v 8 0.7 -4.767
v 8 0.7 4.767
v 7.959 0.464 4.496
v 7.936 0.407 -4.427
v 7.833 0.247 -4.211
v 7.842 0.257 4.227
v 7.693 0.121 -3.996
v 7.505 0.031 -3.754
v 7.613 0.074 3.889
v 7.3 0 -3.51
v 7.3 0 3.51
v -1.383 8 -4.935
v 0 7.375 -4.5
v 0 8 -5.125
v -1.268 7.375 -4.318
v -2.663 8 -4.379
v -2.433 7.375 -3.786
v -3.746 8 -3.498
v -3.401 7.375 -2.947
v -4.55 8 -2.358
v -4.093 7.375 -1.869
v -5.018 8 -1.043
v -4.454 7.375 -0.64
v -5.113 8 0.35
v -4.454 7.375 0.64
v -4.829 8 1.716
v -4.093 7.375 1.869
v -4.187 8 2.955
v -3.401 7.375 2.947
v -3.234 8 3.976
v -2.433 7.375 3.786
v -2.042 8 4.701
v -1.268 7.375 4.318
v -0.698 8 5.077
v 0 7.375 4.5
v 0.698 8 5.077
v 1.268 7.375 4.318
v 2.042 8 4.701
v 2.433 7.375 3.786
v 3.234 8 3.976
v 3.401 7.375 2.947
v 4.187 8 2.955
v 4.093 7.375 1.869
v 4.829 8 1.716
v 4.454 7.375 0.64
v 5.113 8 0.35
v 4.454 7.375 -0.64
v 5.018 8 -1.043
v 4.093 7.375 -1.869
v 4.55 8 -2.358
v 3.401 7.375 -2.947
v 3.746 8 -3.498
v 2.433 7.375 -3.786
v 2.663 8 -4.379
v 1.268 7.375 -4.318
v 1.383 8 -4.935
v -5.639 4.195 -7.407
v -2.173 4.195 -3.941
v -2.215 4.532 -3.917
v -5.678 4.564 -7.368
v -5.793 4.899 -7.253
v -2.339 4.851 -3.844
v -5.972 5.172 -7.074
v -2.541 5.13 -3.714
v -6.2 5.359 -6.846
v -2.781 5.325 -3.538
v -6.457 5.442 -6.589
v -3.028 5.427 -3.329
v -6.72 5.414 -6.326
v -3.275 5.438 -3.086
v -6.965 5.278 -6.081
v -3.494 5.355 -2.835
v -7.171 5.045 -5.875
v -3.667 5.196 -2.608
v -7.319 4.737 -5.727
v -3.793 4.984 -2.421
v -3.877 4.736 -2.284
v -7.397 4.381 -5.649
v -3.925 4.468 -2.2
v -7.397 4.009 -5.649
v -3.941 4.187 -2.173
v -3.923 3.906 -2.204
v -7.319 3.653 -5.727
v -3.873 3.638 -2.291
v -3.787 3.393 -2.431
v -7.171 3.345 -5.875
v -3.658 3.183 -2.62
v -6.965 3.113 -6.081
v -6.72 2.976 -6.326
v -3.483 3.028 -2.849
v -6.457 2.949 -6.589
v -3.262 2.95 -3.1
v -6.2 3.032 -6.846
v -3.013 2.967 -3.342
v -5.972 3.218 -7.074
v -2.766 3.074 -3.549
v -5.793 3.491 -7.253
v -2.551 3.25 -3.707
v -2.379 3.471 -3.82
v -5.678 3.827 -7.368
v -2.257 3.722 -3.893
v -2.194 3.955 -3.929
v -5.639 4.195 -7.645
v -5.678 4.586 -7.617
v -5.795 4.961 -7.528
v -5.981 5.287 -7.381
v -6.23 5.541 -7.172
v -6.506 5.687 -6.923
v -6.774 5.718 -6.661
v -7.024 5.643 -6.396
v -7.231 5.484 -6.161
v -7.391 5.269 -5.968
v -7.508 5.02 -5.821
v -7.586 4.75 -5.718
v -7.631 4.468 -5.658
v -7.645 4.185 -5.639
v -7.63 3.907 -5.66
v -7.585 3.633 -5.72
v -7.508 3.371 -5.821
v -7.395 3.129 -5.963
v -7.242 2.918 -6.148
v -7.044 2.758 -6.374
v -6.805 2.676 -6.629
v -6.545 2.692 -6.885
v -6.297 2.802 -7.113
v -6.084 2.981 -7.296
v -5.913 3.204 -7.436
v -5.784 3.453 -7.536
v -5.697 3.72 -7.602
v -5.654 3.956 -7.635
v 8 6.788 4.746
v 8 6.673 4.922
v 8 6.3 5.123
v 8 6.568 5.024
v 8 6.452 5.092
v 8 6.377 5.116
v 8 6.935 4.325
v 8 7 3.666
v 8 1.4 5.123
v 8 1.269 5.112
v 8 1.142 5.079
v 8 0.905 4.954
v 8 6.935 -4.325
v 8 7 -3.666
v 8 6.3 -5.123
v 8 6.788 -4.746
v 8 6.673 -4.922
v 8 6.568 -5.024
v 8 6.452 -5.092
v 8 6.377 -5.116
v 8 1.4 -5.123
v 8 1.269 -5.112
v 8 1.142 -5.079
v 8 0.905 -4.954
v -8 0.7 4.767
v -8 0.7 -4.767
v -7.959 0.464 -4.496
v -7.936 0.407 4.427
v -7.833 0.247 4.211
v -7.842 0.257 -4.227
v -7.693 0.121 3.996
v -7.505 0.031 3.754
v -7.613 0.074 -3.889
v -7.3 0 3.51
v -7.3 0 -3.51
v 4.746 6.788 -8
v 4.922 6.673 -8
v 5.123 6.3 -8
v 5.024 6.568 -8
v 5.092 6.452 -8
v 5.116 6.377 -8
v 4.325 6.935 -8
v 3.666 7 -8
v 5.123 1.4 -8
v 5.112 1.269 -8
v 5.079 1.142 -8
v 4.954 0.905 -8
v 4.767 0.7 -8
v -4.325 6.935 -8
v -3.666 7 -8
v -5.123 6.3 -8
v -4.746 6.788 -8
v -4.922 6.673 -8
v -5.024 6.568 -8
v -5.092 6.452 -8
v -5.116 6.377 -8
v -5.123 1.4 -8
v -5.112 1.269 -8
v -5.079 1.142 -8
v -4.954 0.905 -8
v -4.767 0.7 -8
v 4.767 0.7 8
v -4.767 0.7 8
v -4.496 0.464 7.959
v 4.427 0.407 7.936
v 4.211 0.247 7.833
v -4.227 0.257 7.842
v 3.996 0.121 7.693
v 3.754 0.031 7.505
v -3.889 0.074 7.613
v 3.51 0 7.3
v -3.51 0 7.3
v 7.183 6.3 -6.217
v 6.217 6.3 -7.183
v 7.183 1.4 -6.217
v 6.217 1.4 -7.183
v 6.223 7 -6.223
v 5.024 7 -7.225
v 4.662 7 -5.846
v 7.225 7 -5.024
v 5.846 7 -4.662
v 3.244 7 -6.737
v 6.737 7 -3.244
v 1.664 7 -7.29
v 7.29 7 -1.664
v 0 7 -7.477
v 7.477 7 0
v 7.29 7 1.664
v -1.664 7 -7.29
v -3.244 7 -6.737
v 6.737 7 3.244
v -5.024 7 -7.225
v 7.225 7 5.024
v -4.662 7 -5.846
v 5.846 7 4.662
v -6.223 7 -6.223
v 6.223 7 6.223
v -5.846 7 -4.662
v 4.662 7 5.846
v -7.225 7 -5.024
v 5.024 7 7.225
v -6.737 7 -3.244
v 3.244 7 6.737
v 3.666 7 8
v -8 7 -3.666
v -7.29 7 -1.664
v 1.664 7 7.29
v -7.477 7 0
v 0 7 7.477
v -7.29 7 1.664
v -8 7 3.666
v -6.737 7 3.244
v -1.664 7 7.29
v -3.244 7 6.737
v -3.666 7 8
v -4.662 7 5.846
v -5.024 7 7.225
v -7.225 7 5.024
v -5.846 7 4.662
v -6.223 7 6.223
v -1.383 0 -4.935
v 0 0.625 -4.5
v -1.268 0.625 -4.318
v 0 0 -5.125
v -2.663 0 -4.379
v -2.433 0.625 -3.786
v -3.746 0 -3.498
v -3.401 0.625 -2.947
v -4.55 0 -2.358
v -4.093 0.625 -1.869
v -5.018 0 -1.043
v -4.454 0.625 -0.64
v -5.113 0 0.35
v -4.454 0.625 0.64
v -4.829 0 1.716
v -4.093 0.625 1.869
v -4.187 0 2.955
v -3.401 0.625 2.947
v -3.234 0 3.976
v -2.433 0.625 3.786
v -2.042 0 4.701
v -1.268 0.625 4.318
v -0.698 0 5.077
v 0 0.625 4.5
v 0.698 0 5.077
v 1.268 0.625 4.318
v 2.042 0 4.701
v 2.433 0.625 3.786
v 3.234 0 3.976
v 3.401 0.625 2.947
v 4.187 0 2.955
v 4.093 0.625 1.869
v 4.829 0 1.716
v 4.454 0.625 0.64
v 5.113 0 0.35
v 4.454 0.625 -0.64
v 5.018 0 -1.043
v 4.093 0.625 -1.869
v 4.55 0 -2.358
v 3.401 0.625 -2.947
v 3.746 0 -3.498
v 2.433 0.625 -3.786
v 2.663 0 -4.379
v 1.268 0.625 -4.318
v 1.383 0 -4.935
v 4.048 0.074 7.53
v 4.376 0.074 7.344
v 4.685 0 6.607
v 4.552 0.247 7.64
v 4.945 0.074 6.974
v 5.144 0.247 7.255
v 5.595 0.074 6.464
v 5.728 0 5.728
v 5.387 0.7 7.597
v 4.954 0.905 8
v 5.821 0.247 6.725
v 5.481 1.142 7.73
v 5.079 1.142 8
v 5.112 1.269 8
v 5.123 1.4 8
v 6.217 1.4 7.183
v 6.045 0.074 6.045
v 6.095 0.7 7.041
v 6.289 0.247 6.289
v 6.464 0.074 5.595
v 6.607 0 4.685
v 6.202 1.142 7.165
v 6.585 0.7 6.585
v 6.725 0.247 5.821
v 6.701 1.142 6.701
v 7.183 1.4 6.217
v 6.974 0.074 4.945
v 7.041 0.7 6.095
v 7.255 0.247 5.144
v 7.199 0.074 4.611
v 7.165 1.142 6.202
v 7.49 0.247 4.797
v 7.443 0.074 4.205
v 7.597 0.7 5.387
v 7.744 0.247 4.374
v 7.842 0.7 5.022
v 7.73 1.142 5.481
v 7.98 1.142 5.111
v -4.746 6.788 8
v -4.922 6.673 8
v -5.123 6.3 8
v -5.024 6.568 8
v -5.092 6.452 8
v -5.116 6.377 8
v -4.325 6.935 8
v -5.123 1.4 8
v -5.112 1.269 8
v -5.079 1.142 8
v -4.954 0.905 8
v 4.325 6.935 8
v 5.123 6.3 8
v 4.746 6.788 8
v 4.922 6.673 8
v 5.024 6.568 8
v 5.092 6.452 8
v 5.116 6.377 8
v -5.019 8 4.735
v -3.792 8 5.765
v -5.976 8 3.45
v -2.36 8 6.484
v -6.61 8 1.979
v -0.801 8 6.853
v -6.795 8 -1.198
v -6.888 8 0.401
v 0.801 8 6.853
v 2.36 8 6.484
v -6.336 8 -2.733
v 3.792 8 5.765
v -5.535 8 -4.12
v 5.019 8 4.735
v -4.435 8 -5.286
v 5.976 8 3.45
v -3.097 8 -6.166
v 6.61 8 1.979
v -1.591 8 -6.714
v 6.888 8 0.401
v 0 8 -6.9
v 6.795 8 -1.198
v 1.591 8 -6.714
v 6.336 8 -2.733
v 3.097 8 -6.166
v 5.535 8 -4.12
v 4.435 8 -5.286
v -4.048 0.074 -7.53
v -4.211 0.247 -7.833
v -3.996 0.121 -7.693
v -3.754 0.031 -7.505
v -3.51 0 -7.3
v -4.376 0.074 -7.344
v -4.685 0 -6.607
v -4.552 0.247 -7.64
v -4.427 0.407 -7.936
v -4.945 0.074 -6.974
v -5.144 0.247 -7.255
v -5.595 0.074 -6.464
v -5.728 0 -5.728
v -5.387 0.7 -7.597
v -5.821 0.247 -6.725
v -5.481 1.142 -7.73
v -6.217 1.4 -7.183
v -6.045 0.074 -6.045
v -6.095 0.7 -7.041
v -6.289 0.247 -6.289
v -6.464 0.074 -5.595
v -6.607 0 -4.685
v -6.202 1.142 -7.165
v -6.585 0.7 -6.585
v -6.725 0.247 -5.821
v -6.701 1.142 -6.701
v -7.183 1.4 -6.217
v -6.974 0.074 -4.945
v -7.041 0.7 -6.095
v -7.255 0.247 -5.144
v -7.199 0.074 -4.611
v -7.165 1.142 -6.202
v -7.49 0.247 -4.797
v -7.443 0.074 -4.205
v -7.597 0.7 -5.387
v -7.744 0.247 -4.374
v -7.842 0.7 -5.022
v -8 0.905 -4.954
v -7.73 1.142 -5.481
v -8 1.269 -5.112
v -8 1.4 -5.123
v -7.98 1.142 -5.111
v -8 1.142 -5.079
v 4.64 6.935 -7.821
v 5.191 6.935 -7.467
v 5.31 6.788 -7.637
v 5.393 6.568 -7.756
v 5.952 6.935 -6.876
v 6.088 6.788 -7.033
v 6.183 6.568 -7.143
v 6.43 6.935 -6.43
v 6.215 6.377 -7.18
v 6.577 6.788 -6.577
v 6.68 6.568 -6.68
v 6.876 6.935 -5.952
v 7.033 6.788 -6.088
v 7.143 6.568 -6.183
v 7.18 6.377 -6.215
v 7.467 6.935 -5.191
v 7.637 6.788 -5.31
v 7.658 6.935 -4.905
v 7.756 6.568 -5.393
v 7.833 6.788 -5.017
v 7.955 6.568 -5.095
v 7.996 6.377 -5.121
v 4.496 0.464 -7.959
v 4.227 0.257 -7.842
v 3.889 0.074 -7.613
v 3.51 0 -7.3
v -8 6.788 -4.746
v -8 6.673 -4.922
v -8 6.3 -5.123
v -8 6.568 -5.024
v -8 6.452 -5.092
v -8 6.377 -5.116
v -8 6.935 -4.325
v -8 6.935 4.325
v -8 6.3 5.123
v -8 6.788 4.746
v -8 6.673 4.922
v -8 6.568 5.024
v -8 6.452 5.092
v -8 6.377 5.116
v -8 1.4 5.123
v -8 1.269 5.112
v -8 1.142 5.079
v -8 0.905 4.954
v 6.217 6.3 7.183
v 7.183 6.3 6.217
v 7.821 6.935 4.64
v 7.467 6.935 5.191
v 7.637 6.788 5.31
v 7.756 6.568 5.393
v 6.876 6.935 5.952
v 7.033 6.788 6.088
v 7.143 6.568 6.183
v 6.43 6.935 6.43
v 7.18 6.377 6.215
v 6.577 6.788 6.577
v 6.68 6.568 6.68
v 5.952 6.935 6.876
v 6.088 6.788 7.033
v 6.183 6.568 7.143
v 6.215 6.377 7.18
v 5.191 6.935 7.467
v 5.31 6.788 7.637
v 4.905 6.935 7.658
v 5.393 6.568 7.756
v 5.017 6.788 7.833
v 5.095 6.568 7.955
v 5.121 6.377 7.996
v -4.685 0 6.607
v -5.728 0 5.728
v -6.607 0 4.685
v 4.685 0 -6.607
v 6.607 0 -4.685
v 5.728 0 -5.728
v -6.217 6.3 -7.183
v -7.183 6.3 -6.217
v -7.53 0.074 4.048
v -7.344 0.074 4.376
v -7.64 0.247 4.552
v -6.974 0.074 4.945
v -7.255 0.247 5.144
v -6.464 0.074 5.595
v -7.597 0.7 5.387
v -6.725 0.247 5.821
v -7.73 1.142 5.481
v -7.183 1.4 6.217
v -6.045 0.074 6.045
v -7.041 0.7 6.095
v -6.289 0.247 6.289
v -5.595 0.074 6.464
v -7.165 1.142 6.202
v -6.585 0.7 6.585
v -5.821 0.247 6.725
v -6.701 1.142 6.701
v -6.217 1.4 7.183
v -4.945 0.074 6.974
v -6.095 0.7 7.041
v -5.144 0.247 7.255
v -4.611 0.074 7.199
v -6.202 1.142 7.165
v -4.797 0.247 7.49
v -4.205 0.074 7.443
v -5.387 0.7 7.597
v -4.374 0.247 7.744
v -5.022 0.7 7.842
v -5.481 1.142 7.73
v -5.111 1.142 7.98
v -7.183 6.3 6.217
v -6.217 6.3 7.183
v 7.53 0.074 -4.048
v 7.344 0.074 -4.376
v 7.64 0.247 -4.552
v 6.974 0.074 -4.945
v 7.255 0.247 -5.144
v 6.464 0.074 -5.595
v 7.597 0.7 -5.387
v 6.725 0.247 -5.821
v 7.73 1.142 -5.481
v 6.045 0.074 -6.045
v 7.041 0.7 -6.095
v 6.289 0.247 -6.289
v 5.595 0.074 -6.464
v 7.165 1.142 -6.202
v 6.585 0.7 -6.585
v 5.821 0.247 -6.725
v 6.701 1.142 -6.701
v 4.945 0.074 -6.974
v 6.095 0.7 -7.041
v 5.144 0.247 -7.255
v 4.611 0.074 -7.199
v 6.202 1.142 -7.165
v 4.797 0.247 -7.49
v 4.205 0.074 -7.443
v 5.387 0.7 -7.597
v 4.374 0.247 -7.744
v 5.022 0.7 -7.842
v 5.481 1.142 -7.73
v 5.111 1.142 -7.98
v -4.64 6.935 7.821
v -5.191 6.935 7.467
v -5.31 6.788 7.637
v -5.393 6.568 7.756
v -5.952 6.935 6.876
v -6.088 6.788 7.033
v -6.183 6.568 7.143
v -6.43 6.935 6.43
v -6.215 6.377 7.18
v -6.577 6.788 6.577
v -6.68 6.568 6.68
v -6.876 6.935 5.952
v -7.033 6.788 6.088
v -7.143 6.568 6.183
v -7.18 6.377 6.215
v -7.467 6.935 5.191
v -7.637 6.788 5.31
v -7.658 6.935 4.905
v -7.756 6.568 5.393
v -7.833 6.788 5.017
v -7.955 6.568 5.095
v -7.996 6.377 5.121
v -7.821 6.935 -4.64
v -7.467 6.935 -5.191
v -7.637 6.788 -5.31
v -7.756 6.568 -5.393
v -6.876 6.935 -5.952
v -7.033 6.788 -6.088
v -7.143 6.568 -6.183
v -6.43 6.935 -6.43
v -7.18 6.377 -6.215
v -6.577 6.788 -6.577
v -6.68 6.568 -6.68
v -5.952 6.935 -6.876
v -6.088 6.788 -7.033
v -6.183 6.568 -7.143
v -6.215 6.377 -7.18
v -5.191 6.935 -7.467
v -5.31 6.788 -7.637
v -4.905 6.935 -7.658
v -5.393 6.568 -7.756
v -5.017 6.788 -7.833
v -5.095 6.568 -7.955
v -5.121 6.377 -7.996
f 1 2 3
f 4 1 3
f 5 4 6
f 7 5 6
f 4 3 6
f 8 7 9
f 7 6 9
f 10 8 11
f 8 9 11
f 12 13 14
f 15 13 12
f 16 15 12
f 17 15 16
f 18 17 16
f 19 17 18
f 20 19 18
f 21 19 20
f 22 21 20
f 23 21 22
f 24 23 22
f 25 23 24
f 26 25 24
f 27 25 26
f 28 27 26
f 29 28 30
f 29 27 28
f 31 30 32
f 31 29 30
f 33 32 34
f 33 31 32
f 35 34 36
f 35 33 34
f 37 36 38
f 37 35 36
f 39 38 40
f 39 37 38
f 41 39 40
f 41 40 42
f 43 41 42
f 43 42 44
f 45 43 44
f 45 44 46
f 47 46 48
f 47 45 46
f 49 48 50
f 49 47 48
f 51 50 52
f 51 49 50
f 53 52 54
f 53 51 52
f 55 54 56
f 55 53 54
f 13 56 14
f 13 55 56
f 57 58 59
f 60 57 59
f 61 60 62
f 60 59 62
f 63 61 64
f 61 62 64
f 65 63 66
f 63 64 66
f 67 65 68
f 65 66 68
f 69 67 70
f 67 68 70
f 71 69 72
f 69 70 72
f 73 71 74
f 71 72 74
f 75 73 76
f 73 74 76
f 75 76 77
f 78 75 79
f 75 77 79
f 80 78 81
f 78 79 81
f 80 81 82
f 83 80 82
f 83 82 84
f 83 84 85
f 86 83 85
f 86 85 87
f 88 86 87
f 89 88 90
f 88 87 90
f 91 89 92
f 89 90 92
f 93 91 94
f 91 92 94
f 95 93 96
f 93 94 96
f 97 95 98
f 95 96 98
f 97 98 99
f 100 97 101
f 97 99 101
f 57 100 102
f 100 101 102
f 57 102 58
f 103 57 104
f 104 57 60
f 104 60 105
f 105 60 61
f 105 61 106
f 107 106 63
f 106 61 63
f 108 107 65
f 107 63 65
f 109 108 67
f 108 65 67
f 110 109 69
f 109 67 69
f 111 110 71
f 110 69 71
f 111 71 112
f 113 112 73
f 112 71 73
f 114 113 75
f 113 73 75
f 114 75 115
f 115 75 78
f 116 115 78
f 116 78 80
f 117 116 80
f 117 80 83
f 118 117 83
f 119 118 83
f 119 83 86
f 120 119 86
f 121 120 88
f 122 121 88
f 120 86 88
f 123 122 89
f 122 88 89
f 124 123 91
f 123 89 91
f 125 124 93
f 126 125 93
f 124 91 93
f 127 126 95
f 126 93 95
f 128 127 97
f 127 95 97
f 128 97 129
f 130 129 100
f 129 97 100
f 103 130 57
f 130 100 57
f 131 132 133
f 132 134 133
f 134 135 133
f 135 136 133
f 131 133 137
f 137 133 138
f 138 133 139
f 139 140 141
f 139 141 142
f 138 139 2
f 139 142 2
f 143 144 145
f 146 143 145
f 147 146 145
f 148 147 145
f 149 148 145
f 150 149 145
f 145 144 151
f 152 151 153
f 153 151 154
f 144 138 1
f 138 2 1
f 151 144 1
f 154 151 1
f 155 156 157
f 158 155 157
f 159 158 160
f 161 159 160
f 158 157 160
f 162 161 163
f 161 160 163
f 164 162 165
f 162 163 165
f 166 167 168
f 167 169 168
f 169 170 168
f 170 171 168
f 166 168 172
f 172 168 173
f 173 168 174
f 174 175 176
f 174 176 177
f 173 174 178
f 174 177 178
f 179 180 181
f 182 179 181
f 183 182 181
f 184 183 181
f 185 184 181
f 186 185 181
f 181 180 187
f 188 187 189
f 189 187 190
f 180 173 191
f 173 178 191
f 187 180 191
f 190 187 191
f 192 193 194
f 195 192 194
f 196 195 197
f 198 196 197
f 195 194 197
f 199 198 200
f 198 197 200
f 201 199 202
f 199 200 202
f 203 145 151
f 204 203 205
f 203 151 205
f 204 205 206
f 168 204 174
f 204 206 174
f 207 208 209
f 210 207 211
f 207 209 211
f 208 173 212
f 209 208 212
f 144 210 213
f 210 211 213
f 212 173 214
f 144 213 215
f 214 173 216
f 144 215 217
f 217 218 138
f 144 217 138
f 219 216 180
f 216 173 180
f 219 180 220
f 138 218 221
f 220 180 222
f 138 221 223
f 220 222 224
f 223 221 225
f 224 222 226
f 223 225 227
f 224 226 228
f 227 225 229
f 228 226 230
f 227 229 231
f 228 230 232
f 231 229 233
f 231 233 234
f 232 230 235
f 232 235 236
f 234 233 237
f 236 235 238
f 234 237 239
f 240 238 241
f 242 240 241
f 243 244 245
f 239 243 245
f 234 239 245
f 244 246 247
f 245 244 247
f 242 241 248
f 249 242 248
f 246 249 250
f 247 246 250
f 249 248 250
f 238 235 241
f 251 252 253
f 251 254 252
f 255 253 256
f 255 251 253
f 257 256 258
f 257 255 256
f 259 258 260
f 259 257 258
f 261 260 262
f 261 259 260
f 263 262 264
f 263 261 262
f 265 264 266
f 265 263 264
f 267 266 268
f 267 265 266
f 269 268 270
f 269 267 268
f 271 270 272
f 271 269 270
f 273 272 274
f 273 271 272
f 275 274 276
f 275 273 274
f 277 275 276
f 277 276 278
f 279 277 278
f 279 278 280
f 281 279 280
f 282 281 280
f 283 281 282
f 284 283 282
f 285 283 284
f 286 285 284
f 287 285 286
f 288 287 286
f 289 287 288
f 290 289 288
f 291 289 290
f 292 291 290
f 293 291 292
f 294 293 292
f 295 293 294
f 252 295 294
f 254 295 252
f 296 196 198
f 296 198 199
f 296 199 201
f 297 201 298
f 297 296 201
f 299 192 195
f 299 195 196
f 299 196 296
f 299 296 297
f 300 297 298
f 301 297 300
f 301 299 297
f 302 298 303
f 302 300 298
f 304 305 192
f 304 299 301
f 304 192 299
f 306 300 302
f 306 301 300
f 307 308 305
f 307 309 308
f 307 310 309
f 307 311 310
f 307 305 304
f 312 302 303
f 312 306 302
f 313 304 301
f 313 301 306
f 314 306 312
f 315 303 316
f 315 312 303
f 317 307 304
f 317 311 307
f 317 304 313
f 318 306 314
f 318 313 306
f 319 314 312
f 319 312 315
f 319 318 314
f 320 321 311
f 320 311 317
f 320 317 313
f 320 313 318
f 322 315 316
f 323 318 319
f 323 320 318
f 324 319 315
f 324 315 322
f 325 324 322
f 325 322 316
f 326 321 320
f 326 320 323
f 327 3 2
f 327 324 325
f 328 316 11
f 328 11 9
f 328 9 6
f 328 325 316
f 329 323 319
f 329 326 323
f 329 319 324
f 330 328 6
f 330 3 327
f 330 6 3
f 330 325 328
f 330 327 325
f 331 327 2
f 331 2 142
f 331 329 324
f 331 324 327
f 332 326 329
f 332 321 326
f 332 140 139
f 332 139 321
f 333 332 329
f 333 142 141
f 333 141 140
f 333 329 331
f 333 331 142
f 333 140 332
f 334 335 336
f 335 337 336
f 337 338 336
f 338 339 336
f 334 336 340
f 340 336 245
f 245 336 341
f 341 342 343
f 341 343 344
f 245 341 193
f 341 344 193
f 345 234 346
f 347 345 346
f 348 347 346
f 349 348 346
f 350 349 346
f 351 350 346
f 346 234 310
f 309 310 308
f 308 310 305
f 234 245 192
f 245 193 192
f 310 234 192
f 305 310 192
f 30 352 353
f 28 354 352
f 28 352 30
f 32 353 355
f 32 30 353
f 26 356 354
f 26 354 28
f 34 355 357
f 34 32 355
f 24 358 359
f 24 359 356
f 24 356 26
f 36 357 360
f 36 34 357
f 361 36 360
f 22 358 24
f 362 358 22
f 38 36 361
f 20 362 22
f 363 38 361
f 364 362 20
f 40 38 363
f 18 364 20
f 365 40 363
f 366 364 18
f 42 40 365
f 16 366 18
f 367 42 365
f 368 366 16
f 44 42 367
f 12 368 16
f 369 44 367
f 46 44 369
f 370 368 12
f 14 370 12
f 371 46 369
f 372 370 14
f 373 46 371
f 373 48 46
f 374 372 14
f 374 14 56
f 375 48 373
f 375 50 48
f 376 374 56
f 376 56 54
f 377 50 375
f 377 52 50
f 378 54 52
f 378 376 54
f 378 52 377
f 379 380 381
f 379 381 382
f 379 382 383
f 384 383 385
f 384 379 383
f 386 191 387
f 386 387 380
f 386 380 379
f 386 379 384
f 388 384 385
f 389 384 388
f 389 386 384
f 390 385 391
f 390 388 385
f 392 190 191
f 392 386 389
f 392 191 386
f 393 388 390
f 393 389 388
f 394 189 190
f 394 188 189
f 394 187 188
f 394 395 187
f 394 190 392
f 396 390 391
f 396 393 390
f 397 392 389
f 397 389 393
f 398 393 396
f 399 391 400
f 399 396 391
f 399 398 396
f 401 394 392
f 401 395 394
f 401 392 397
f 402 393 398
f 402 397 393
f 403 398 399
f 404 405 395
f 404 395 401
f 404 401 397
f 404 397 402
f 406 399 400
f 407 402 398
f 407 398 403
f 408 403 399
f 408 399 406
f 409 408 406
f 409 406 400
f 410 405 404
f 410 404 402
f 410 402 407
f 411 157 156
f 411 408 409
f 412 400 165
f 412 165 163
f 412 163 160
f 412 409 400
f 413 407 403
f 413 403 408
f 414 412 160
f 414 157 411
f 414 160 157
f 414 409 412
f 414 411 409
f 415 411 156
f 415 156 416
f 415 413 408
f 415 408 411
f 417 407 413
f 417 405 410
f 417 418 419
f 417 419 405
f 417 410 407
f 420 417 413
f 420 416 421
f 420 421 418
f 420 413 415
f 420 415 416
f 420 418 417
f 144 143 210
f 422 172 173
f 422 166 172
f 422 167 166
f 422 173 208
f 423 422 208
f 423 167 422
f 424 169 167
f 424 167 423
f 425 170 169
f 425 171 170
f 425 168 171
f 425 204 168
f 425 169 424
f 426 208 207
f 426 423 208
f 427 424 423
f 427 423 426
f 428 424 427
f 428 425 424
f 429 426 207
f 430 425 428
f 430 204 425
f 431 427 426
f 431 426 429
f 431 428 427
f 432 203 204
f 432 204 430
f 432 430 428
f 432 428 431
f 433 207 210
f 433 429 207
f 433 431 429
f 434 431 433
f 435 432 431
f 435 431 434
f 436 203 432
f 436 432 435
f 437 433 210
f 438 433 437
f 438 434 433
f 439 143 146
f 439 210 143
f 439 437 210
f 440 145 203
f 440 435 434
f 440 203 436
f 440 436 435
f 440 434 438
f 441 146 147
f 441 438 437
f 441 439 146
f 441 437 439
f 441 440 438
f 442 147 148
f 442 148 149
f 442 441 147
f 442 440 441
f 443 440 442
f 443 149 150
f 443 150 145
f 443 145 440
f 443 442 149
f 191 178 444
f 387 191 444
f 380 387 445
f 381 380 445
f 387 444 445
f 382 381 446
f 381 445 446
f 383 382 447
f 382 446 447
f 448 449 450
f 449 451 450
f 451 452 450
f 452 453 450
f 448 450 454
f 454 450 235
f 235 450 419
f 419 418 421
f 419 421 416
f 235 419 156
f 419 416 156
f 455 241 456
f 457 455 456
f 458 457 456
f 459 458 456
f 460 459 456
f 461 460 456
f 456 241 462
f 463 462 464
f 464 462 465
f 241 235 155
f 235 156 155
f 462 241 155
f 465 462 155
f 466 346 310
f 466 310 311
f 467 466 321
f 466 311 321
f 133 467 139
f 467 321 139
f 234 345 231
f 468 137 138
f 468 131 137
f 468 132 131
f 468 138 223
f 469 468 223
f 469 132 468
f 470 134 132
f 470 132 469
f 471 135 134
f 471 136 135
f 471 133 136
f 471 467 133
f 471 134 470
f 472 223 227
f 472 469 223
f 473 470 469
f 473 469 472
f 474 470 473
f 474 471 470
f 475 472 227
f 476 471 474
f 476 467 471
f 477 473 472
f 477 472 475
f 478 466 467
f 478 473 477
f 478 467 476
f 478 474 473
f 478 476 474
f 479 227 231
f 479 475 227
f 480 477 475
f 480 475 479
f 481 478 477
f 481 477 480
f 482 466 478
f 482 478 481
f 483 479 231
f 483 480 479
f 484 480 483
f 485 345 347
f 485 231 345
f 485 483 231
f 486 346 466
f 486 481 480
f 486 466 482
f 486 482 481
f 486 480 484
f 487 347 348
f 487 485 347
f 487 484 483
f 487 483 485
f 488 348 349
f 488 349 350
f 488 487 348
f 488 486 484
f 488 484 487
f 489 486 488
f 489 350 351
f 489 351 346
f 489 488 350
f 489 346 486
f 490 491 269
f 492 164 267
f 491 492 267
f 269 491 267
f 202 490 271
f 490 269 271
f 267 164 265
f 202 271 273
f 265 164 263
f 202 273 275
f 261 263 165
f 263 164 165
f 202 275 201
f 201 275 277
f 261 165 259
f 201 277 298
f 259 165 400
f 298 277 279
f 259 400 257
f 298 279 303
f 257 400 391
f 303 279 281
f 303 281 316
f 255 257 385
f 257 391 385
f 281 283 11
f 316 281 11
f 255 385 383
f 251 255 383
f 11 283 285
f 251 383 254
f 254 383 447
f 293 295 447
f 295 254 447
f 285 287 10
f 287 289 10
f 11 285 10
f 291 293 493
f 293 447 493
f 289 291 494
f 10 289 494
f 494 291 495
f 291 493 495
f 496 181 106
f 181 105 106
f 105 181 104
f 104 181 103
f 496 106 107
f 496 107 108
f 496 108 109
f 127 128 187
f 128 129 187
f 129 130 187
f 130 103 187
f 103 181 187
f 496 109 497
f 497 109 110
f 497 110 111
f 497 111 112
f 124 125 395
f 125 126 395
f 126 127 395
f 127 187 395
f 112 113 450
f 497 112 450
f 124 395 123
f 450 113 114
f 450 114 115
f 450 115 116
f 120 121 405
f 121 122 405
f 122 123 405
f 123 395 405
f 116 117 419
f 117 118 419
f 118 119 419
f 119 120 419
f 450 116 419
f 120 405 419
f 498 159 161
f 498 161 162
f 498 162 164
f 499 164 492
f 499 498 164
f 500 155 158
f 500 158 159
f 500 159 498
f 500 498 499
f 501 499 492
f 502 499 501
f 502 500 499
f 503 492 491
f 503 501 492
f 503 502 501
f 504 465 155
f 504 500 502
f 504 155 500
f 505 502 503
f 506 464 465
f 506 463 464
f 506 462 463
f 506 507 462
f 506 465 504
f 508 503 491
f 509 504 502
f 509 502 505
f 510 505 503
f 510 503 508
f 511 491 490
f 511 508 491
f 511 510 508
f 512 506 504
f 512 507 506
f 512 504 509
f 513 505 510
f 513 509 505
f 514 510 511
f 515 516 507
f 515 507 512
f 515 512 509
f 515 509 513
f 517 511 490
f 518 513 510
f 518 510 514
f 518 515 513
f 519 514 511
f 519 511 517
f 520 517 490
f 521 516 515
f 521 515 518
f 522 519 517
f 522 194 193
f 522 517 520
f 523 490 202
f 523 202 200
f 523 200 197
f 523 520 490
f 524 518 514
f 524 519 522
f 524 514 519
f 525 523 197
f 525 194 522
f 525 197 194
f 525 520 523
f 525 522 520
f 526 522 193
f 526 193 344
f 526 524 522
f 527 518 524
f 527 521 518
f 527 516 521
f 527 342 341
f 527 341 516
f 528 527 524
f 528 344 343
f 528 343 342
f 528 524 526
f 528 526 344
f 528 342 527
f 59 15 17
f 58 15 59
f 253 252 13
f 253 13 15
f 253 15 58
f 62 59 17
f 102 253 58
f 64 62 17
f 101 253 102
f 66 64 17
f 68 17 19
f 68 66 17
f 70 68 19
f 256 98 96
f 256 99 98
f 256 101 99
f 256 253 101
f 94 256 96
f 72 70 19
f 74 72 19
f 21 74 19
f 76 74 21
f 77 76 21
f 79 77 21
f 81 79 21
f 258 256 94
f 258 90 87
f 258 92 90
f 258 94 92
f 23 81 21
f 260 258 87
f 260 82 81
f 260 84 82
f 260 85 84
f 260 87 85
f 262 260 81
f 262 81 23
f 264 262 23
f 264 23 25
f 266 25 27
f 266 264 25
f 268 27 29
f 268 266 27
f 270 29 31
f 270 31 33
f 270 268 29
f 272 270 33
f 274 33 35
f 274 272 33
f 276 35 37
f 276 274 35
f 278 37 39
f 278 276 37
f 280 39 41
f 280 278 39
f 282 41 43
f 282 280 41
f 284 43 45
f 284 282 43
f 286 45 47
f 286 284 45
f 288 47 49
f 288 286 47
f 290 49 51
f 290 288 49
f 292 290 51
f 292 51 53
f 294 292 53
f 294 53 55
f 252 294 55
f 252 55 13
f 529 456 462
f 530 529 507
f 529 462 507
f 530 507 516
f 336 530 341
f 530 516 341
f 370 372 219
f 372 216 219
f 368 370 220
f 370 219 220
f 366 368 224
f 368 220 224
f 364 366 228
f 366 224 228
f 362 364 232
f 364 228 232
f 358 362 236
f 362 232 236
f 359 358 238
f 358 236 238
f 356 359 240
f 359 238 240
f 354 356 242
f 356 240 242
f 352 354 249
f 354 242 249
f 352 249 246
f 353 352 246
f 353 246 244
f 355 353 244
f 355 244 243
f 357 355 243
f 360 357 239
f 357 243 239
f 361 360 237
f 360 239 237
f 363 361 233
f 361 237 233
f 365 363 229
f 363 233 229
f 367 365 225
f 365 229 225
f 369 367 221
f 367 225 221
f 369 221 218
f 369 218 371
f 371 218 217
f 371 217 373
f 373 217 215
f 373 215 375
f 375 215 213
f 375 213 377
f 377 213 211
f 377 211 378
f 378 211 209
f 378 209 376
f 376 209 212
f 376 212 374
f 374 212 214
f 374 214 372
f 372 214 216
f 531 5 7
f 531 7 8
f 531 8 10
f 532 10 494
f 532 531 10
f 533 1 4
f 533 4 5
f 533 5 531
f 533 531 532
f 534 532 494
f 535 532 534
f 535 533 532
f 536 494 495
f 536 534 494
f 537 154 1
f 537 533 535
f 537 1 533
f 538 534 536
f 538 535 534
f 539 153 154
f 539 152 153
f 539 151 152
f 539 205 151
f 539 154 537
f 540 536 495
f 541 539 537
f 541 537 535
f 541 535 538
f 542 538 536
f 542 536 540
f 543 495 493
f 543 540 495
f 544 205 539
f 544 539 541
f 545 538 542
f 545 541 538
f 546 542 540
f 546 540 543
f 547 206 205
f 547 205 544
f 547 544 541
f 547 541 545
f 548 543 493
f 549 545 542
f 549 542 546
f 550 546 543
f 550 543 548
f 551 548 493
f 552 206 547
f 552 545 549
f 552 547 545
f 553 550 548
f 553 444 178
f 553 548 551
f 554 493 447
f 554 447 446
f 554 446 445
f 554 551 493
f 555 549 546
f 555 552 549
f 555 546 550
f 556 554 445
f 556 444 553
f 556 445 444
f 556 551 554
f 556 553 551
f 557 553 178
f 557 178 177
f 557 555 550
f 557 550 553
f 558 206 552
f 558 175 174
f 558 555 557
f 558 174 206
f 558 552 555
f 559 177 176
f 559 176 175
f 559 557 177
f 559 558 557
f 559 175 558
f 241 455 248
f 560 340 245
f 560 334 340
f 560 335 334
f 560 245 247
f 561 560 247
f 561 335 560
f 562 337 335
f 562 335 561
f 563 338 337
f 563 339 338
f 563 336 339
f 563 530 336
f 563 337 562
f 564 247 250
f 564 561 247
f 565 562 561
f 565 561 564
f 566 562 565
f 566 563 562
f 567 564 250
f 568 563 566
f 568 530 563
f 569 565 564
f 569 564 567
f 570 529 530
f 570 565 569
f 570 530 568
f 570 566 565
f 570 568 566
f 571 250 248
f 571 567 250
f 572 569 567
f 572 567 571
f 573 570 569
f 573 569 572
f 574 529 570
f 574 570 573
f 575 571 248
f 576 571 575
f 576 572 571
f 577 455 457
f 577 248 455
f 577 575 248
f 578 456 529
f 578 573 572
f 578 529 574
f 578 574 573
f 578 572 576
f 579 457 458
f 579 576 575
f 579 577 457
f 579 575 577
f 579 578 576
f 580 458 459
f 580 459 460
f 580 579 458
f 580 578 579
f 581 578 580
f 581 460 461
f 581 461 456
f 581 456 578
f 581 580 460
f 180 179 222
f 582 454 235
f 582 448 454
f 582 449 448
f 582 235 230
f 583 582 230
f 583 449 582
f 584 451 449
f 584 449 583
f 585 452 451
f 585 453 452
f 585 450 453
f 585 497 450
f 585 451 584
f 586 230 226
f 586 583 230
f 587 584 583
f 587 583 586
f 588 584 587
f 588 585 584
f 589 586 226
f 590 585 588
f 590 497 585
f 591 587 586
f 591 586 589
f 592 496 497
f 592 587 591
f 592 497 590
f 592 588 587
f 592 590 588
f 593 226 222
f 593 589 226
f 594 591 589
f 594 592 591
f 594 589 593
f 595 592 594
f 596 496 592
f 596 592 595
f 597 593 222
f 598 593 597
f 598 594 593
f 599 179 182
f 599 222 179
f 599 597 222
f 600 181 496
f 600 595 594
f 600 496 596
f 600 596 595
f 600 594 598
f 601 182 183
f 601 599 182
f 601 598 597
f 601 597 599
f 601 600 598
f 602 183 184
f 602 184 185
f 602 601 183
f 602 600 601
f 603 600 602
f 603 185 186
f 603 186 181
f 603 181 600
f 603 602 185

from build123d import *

# Parameters (mm, degrees)
BOSS_EXTRUDE1_DEPTH = 8
FILLET2_R           = 1.4
FILLET3_R           = 0.7


with BuildPart() as part:
    # Sketch1 → Boss-Extrude1 (new body)
    with BuildSketch(Plane(origin=(0, 0, 0), x_dir=(1, 0, 0), z_dir=(0, 1, 0))):
        with BuildLine():
            Line((-8, 5.123475383), (-8, -5.123475383))
            ThreePointArc((-8, -5.123475383), (-6.717514421, -6.717514421), (-5.123475383, -8))
            Line((-5.123475383, -8), (5.123475383, -8))
            ThreePointArc((5.123475383, -8), (6.717514421, -6.717514421), (8, -5.123475383))
            Line((8, -5.123475383), (8, 5.123475383))
            ThreePointArc((8, 5.123475383), (6.717514421, 6.717514421), (5.123475383, 8))
            Line((5.123475383, 8), (-5.123475383, 8))
            ThreePointArc((-5.123475383, 8), (-6.717514421, 6.717514421), (-8, 5.123475383))
        make_face()
    extrude(amount=BOSS_EXTRUDE1_DEPTH)

    # Sketch2 → Cut-Revolve1 (revolve, cut)
    with BuildSketch(Plane.XY, mode=Mode.PRIVATE) as cut_revolve1_sk:
        Polygon((6.9, 8), (7.477350269, 7), (9.756701135, 7), (9.756701135, 8), align=None)
    revolve(cut_revolve1_sk.sketch.rotate(Axis((0, 0, 0), (0, 1, 0)), 90), axis=Axis((0, 0, 0), (0, 1, 0)), mode=Mode.SUBTRACT)

    # Sketch5 → M10x1.0 Tapped Hole1 (revolve, cut)
    with BuildSketch(Plane(origin=(0, 0, 0), x_dir=(0, 0, -1), z_dir=(1, 0, 0))):
        Polygon((0, 0), (0, 8), (5.125, 8), (4.5, 7.375), (4.5, 0.625), (5.125, 0), align=None)
    revolve(axis=Axis((0, -6.35, 0), (0, 1, 0)), mode=Mode.SUBTRACT)

    # M3 Tapped Hole1: read off the stored shape, not the designer's step
    # M3 Tapped Hole1 outline → M3 Tapped Hole1 (revolve, cut)
    with BuildSketch(Plane(origin=(0, 4.19513424, 0), x_dir=(0.7071067811865471, 0, -0.707106781186548), z_dir=(0, -1, 0))):
        Polygon((0, -9.500060785), (1.525060785, -9.500060785), (1.25, -9.225), (1.25, -4.322803032), (0, -4.322803032), align=None)
    revolve(axis=Axis((0, 4.19513424, 0), (0.707106781186548, 0, 0.7071067811865471)), mode=Mode.SUBTRACT)

    # Fillet2
    fillet2_edges = [part.edges().sort_by_distance(p)[0] for p in [
        (6.717514421, 0, 6.717514421),
        (-6.717514421, 0, 6.717514421),
        (-6.717514421, 0, -6.717514421),
        (6.717514421, 0, -6.717514421),
    ]]
    fillet(fillet2_edges, radius=FILLET2_R)

    # Fillet3
    # the kernel refuses this fillet: 0.7 mm, written as the material it takes off along each edge
    with BuildSketch(Plane(origin=(0, 7, 0), x_dir=(-0.3759346527851674, 0, 0.9266461767229688), z_dir=(0.9266461767229688, 0, 0.3759346527851674))) as fillet3_piece_1:
        with BuildLine():
            CenterArc((9.5 - FILLET3_R, FILLET3_R), FILLET3_R, 270, 90)
            Line((9.5, FILLET3_R), (9.5, 0))
            Line((9.5, 0), (9.5 - FILLET3_R, 0))
        make_face()
    revolve(axis=Axis((0, 7, 0), (0, -1, 0)), revolution_arc=45.835816267, mode=Mode.SUBTRACT)
    with BuildSketch(Plane(origin=(0, 7, 0), x_dir=(-0.9266461767229688, 0, -0.3759346527851675), z_dir=(-0.3759346527851675, 0, 0.9266461767229688))) as fillet3_piece_2:
        with BuildLine():
            CenterArc((9.5 - FILLET3_R, FILLET3_R), FILLET3_R, 270, 90)
            Line((9.5 - FILLET3_R, 0), (9.5, 0))
            Line((9.5, 0), (9.5, FILLET3_R))
        make_face()
    revolve(axis=Axis((0, 7, 0), (0, -1, 0)), revolution_arc=45.835816267, mode=Mode.SUBTRACT)
    with BuildSketch(Plane(origin=(0, 7, 0), x_dir=(0.3759346527851687, 0, -0.9266461767229682), z_dir=(-0.9266461767229682, 0, -0.3759346527851687))) as fillet3_piece_3:
        with BuildLine():
            CenterArc((9.5 - FILLET3_R, FILLET3_R), FILLET3_R, 270, 90)
            Line((9.5 - FILLET3_R, 0), (9.5, 0))
            Line((9.5, 0), (9.5, FILLET3_R))
        make_face()
    revolve(axis=Axis((0, 7, 0), (0, -1, 0)), revolution_arc=45.835816267, mode=Mode.SUBTRACT)
    with BuildSketch(Plane(origin=(0, 7, 0), x_dir=(0.9266461767229706, 0, 0.3759346527851629), z_dir=(0.3759346527851629, 0, -0.9266461767229706))) as fillet3_piece_4:
        with BuildLine():
            CenterArc((9.5 - FILLET3_R, FILLET3_R), FILLET3_R, 270, 90)
            Line((9.5, FILLET3_R), (9.5, 0))
            Line((9.5, 0), (9.5 - FILLET3_R, 0))
        make_face()
    revolve(axis=Axis((0, 7, 0), (0, -1, 0)), revolution_arc=45.835816267, mode=Mode.SUBTRACT)
    with BuildSketch(Plane(origin=(8, 0, 6.518857754), x_dir=(-1, 0, 0), z_dir=(0, 0, -1)), Plane(origin=(-6.518857754, 0, 8), x_dir=(0, 0, -1), z_dir=(1, 0, 0)), Plane(origin=(-8, 0, -6.518857754), x_dir=(1, 0, 0), z_dir=(0, 0, 1))) as fillet3_piece_5:
        with BuildLine():
            CenterArc((FILLET3_R, FILLET3_R), FILLET3_R, 180, 90)
            Line((0, FILLET3_R), (0, 0))
            Line((0, 0), (FILLET3_R, 0))
        make_face()
    extrude(amount=13.037715508, mode=Mode.SUBTRACT)
    with BuildSketch(Plane(origin=(6.518857754, 0, -8), x_dir=(0, 1, 0), z_dir=(-1, 0, 0))) as fillet3_piece_6:
        with BuildLine():
            CenterArc((FILLET3_R, -FILLET3_R), FILLET3_R, 90, 90)
            Line((0, -FILLET3_R), (0, 0))
            Line((0, 0), (FILLET3_R, 0))
        make_face()
    extrude(amount=13.037715508, mode=Mode.SUBTRACT)


solid = part.part
